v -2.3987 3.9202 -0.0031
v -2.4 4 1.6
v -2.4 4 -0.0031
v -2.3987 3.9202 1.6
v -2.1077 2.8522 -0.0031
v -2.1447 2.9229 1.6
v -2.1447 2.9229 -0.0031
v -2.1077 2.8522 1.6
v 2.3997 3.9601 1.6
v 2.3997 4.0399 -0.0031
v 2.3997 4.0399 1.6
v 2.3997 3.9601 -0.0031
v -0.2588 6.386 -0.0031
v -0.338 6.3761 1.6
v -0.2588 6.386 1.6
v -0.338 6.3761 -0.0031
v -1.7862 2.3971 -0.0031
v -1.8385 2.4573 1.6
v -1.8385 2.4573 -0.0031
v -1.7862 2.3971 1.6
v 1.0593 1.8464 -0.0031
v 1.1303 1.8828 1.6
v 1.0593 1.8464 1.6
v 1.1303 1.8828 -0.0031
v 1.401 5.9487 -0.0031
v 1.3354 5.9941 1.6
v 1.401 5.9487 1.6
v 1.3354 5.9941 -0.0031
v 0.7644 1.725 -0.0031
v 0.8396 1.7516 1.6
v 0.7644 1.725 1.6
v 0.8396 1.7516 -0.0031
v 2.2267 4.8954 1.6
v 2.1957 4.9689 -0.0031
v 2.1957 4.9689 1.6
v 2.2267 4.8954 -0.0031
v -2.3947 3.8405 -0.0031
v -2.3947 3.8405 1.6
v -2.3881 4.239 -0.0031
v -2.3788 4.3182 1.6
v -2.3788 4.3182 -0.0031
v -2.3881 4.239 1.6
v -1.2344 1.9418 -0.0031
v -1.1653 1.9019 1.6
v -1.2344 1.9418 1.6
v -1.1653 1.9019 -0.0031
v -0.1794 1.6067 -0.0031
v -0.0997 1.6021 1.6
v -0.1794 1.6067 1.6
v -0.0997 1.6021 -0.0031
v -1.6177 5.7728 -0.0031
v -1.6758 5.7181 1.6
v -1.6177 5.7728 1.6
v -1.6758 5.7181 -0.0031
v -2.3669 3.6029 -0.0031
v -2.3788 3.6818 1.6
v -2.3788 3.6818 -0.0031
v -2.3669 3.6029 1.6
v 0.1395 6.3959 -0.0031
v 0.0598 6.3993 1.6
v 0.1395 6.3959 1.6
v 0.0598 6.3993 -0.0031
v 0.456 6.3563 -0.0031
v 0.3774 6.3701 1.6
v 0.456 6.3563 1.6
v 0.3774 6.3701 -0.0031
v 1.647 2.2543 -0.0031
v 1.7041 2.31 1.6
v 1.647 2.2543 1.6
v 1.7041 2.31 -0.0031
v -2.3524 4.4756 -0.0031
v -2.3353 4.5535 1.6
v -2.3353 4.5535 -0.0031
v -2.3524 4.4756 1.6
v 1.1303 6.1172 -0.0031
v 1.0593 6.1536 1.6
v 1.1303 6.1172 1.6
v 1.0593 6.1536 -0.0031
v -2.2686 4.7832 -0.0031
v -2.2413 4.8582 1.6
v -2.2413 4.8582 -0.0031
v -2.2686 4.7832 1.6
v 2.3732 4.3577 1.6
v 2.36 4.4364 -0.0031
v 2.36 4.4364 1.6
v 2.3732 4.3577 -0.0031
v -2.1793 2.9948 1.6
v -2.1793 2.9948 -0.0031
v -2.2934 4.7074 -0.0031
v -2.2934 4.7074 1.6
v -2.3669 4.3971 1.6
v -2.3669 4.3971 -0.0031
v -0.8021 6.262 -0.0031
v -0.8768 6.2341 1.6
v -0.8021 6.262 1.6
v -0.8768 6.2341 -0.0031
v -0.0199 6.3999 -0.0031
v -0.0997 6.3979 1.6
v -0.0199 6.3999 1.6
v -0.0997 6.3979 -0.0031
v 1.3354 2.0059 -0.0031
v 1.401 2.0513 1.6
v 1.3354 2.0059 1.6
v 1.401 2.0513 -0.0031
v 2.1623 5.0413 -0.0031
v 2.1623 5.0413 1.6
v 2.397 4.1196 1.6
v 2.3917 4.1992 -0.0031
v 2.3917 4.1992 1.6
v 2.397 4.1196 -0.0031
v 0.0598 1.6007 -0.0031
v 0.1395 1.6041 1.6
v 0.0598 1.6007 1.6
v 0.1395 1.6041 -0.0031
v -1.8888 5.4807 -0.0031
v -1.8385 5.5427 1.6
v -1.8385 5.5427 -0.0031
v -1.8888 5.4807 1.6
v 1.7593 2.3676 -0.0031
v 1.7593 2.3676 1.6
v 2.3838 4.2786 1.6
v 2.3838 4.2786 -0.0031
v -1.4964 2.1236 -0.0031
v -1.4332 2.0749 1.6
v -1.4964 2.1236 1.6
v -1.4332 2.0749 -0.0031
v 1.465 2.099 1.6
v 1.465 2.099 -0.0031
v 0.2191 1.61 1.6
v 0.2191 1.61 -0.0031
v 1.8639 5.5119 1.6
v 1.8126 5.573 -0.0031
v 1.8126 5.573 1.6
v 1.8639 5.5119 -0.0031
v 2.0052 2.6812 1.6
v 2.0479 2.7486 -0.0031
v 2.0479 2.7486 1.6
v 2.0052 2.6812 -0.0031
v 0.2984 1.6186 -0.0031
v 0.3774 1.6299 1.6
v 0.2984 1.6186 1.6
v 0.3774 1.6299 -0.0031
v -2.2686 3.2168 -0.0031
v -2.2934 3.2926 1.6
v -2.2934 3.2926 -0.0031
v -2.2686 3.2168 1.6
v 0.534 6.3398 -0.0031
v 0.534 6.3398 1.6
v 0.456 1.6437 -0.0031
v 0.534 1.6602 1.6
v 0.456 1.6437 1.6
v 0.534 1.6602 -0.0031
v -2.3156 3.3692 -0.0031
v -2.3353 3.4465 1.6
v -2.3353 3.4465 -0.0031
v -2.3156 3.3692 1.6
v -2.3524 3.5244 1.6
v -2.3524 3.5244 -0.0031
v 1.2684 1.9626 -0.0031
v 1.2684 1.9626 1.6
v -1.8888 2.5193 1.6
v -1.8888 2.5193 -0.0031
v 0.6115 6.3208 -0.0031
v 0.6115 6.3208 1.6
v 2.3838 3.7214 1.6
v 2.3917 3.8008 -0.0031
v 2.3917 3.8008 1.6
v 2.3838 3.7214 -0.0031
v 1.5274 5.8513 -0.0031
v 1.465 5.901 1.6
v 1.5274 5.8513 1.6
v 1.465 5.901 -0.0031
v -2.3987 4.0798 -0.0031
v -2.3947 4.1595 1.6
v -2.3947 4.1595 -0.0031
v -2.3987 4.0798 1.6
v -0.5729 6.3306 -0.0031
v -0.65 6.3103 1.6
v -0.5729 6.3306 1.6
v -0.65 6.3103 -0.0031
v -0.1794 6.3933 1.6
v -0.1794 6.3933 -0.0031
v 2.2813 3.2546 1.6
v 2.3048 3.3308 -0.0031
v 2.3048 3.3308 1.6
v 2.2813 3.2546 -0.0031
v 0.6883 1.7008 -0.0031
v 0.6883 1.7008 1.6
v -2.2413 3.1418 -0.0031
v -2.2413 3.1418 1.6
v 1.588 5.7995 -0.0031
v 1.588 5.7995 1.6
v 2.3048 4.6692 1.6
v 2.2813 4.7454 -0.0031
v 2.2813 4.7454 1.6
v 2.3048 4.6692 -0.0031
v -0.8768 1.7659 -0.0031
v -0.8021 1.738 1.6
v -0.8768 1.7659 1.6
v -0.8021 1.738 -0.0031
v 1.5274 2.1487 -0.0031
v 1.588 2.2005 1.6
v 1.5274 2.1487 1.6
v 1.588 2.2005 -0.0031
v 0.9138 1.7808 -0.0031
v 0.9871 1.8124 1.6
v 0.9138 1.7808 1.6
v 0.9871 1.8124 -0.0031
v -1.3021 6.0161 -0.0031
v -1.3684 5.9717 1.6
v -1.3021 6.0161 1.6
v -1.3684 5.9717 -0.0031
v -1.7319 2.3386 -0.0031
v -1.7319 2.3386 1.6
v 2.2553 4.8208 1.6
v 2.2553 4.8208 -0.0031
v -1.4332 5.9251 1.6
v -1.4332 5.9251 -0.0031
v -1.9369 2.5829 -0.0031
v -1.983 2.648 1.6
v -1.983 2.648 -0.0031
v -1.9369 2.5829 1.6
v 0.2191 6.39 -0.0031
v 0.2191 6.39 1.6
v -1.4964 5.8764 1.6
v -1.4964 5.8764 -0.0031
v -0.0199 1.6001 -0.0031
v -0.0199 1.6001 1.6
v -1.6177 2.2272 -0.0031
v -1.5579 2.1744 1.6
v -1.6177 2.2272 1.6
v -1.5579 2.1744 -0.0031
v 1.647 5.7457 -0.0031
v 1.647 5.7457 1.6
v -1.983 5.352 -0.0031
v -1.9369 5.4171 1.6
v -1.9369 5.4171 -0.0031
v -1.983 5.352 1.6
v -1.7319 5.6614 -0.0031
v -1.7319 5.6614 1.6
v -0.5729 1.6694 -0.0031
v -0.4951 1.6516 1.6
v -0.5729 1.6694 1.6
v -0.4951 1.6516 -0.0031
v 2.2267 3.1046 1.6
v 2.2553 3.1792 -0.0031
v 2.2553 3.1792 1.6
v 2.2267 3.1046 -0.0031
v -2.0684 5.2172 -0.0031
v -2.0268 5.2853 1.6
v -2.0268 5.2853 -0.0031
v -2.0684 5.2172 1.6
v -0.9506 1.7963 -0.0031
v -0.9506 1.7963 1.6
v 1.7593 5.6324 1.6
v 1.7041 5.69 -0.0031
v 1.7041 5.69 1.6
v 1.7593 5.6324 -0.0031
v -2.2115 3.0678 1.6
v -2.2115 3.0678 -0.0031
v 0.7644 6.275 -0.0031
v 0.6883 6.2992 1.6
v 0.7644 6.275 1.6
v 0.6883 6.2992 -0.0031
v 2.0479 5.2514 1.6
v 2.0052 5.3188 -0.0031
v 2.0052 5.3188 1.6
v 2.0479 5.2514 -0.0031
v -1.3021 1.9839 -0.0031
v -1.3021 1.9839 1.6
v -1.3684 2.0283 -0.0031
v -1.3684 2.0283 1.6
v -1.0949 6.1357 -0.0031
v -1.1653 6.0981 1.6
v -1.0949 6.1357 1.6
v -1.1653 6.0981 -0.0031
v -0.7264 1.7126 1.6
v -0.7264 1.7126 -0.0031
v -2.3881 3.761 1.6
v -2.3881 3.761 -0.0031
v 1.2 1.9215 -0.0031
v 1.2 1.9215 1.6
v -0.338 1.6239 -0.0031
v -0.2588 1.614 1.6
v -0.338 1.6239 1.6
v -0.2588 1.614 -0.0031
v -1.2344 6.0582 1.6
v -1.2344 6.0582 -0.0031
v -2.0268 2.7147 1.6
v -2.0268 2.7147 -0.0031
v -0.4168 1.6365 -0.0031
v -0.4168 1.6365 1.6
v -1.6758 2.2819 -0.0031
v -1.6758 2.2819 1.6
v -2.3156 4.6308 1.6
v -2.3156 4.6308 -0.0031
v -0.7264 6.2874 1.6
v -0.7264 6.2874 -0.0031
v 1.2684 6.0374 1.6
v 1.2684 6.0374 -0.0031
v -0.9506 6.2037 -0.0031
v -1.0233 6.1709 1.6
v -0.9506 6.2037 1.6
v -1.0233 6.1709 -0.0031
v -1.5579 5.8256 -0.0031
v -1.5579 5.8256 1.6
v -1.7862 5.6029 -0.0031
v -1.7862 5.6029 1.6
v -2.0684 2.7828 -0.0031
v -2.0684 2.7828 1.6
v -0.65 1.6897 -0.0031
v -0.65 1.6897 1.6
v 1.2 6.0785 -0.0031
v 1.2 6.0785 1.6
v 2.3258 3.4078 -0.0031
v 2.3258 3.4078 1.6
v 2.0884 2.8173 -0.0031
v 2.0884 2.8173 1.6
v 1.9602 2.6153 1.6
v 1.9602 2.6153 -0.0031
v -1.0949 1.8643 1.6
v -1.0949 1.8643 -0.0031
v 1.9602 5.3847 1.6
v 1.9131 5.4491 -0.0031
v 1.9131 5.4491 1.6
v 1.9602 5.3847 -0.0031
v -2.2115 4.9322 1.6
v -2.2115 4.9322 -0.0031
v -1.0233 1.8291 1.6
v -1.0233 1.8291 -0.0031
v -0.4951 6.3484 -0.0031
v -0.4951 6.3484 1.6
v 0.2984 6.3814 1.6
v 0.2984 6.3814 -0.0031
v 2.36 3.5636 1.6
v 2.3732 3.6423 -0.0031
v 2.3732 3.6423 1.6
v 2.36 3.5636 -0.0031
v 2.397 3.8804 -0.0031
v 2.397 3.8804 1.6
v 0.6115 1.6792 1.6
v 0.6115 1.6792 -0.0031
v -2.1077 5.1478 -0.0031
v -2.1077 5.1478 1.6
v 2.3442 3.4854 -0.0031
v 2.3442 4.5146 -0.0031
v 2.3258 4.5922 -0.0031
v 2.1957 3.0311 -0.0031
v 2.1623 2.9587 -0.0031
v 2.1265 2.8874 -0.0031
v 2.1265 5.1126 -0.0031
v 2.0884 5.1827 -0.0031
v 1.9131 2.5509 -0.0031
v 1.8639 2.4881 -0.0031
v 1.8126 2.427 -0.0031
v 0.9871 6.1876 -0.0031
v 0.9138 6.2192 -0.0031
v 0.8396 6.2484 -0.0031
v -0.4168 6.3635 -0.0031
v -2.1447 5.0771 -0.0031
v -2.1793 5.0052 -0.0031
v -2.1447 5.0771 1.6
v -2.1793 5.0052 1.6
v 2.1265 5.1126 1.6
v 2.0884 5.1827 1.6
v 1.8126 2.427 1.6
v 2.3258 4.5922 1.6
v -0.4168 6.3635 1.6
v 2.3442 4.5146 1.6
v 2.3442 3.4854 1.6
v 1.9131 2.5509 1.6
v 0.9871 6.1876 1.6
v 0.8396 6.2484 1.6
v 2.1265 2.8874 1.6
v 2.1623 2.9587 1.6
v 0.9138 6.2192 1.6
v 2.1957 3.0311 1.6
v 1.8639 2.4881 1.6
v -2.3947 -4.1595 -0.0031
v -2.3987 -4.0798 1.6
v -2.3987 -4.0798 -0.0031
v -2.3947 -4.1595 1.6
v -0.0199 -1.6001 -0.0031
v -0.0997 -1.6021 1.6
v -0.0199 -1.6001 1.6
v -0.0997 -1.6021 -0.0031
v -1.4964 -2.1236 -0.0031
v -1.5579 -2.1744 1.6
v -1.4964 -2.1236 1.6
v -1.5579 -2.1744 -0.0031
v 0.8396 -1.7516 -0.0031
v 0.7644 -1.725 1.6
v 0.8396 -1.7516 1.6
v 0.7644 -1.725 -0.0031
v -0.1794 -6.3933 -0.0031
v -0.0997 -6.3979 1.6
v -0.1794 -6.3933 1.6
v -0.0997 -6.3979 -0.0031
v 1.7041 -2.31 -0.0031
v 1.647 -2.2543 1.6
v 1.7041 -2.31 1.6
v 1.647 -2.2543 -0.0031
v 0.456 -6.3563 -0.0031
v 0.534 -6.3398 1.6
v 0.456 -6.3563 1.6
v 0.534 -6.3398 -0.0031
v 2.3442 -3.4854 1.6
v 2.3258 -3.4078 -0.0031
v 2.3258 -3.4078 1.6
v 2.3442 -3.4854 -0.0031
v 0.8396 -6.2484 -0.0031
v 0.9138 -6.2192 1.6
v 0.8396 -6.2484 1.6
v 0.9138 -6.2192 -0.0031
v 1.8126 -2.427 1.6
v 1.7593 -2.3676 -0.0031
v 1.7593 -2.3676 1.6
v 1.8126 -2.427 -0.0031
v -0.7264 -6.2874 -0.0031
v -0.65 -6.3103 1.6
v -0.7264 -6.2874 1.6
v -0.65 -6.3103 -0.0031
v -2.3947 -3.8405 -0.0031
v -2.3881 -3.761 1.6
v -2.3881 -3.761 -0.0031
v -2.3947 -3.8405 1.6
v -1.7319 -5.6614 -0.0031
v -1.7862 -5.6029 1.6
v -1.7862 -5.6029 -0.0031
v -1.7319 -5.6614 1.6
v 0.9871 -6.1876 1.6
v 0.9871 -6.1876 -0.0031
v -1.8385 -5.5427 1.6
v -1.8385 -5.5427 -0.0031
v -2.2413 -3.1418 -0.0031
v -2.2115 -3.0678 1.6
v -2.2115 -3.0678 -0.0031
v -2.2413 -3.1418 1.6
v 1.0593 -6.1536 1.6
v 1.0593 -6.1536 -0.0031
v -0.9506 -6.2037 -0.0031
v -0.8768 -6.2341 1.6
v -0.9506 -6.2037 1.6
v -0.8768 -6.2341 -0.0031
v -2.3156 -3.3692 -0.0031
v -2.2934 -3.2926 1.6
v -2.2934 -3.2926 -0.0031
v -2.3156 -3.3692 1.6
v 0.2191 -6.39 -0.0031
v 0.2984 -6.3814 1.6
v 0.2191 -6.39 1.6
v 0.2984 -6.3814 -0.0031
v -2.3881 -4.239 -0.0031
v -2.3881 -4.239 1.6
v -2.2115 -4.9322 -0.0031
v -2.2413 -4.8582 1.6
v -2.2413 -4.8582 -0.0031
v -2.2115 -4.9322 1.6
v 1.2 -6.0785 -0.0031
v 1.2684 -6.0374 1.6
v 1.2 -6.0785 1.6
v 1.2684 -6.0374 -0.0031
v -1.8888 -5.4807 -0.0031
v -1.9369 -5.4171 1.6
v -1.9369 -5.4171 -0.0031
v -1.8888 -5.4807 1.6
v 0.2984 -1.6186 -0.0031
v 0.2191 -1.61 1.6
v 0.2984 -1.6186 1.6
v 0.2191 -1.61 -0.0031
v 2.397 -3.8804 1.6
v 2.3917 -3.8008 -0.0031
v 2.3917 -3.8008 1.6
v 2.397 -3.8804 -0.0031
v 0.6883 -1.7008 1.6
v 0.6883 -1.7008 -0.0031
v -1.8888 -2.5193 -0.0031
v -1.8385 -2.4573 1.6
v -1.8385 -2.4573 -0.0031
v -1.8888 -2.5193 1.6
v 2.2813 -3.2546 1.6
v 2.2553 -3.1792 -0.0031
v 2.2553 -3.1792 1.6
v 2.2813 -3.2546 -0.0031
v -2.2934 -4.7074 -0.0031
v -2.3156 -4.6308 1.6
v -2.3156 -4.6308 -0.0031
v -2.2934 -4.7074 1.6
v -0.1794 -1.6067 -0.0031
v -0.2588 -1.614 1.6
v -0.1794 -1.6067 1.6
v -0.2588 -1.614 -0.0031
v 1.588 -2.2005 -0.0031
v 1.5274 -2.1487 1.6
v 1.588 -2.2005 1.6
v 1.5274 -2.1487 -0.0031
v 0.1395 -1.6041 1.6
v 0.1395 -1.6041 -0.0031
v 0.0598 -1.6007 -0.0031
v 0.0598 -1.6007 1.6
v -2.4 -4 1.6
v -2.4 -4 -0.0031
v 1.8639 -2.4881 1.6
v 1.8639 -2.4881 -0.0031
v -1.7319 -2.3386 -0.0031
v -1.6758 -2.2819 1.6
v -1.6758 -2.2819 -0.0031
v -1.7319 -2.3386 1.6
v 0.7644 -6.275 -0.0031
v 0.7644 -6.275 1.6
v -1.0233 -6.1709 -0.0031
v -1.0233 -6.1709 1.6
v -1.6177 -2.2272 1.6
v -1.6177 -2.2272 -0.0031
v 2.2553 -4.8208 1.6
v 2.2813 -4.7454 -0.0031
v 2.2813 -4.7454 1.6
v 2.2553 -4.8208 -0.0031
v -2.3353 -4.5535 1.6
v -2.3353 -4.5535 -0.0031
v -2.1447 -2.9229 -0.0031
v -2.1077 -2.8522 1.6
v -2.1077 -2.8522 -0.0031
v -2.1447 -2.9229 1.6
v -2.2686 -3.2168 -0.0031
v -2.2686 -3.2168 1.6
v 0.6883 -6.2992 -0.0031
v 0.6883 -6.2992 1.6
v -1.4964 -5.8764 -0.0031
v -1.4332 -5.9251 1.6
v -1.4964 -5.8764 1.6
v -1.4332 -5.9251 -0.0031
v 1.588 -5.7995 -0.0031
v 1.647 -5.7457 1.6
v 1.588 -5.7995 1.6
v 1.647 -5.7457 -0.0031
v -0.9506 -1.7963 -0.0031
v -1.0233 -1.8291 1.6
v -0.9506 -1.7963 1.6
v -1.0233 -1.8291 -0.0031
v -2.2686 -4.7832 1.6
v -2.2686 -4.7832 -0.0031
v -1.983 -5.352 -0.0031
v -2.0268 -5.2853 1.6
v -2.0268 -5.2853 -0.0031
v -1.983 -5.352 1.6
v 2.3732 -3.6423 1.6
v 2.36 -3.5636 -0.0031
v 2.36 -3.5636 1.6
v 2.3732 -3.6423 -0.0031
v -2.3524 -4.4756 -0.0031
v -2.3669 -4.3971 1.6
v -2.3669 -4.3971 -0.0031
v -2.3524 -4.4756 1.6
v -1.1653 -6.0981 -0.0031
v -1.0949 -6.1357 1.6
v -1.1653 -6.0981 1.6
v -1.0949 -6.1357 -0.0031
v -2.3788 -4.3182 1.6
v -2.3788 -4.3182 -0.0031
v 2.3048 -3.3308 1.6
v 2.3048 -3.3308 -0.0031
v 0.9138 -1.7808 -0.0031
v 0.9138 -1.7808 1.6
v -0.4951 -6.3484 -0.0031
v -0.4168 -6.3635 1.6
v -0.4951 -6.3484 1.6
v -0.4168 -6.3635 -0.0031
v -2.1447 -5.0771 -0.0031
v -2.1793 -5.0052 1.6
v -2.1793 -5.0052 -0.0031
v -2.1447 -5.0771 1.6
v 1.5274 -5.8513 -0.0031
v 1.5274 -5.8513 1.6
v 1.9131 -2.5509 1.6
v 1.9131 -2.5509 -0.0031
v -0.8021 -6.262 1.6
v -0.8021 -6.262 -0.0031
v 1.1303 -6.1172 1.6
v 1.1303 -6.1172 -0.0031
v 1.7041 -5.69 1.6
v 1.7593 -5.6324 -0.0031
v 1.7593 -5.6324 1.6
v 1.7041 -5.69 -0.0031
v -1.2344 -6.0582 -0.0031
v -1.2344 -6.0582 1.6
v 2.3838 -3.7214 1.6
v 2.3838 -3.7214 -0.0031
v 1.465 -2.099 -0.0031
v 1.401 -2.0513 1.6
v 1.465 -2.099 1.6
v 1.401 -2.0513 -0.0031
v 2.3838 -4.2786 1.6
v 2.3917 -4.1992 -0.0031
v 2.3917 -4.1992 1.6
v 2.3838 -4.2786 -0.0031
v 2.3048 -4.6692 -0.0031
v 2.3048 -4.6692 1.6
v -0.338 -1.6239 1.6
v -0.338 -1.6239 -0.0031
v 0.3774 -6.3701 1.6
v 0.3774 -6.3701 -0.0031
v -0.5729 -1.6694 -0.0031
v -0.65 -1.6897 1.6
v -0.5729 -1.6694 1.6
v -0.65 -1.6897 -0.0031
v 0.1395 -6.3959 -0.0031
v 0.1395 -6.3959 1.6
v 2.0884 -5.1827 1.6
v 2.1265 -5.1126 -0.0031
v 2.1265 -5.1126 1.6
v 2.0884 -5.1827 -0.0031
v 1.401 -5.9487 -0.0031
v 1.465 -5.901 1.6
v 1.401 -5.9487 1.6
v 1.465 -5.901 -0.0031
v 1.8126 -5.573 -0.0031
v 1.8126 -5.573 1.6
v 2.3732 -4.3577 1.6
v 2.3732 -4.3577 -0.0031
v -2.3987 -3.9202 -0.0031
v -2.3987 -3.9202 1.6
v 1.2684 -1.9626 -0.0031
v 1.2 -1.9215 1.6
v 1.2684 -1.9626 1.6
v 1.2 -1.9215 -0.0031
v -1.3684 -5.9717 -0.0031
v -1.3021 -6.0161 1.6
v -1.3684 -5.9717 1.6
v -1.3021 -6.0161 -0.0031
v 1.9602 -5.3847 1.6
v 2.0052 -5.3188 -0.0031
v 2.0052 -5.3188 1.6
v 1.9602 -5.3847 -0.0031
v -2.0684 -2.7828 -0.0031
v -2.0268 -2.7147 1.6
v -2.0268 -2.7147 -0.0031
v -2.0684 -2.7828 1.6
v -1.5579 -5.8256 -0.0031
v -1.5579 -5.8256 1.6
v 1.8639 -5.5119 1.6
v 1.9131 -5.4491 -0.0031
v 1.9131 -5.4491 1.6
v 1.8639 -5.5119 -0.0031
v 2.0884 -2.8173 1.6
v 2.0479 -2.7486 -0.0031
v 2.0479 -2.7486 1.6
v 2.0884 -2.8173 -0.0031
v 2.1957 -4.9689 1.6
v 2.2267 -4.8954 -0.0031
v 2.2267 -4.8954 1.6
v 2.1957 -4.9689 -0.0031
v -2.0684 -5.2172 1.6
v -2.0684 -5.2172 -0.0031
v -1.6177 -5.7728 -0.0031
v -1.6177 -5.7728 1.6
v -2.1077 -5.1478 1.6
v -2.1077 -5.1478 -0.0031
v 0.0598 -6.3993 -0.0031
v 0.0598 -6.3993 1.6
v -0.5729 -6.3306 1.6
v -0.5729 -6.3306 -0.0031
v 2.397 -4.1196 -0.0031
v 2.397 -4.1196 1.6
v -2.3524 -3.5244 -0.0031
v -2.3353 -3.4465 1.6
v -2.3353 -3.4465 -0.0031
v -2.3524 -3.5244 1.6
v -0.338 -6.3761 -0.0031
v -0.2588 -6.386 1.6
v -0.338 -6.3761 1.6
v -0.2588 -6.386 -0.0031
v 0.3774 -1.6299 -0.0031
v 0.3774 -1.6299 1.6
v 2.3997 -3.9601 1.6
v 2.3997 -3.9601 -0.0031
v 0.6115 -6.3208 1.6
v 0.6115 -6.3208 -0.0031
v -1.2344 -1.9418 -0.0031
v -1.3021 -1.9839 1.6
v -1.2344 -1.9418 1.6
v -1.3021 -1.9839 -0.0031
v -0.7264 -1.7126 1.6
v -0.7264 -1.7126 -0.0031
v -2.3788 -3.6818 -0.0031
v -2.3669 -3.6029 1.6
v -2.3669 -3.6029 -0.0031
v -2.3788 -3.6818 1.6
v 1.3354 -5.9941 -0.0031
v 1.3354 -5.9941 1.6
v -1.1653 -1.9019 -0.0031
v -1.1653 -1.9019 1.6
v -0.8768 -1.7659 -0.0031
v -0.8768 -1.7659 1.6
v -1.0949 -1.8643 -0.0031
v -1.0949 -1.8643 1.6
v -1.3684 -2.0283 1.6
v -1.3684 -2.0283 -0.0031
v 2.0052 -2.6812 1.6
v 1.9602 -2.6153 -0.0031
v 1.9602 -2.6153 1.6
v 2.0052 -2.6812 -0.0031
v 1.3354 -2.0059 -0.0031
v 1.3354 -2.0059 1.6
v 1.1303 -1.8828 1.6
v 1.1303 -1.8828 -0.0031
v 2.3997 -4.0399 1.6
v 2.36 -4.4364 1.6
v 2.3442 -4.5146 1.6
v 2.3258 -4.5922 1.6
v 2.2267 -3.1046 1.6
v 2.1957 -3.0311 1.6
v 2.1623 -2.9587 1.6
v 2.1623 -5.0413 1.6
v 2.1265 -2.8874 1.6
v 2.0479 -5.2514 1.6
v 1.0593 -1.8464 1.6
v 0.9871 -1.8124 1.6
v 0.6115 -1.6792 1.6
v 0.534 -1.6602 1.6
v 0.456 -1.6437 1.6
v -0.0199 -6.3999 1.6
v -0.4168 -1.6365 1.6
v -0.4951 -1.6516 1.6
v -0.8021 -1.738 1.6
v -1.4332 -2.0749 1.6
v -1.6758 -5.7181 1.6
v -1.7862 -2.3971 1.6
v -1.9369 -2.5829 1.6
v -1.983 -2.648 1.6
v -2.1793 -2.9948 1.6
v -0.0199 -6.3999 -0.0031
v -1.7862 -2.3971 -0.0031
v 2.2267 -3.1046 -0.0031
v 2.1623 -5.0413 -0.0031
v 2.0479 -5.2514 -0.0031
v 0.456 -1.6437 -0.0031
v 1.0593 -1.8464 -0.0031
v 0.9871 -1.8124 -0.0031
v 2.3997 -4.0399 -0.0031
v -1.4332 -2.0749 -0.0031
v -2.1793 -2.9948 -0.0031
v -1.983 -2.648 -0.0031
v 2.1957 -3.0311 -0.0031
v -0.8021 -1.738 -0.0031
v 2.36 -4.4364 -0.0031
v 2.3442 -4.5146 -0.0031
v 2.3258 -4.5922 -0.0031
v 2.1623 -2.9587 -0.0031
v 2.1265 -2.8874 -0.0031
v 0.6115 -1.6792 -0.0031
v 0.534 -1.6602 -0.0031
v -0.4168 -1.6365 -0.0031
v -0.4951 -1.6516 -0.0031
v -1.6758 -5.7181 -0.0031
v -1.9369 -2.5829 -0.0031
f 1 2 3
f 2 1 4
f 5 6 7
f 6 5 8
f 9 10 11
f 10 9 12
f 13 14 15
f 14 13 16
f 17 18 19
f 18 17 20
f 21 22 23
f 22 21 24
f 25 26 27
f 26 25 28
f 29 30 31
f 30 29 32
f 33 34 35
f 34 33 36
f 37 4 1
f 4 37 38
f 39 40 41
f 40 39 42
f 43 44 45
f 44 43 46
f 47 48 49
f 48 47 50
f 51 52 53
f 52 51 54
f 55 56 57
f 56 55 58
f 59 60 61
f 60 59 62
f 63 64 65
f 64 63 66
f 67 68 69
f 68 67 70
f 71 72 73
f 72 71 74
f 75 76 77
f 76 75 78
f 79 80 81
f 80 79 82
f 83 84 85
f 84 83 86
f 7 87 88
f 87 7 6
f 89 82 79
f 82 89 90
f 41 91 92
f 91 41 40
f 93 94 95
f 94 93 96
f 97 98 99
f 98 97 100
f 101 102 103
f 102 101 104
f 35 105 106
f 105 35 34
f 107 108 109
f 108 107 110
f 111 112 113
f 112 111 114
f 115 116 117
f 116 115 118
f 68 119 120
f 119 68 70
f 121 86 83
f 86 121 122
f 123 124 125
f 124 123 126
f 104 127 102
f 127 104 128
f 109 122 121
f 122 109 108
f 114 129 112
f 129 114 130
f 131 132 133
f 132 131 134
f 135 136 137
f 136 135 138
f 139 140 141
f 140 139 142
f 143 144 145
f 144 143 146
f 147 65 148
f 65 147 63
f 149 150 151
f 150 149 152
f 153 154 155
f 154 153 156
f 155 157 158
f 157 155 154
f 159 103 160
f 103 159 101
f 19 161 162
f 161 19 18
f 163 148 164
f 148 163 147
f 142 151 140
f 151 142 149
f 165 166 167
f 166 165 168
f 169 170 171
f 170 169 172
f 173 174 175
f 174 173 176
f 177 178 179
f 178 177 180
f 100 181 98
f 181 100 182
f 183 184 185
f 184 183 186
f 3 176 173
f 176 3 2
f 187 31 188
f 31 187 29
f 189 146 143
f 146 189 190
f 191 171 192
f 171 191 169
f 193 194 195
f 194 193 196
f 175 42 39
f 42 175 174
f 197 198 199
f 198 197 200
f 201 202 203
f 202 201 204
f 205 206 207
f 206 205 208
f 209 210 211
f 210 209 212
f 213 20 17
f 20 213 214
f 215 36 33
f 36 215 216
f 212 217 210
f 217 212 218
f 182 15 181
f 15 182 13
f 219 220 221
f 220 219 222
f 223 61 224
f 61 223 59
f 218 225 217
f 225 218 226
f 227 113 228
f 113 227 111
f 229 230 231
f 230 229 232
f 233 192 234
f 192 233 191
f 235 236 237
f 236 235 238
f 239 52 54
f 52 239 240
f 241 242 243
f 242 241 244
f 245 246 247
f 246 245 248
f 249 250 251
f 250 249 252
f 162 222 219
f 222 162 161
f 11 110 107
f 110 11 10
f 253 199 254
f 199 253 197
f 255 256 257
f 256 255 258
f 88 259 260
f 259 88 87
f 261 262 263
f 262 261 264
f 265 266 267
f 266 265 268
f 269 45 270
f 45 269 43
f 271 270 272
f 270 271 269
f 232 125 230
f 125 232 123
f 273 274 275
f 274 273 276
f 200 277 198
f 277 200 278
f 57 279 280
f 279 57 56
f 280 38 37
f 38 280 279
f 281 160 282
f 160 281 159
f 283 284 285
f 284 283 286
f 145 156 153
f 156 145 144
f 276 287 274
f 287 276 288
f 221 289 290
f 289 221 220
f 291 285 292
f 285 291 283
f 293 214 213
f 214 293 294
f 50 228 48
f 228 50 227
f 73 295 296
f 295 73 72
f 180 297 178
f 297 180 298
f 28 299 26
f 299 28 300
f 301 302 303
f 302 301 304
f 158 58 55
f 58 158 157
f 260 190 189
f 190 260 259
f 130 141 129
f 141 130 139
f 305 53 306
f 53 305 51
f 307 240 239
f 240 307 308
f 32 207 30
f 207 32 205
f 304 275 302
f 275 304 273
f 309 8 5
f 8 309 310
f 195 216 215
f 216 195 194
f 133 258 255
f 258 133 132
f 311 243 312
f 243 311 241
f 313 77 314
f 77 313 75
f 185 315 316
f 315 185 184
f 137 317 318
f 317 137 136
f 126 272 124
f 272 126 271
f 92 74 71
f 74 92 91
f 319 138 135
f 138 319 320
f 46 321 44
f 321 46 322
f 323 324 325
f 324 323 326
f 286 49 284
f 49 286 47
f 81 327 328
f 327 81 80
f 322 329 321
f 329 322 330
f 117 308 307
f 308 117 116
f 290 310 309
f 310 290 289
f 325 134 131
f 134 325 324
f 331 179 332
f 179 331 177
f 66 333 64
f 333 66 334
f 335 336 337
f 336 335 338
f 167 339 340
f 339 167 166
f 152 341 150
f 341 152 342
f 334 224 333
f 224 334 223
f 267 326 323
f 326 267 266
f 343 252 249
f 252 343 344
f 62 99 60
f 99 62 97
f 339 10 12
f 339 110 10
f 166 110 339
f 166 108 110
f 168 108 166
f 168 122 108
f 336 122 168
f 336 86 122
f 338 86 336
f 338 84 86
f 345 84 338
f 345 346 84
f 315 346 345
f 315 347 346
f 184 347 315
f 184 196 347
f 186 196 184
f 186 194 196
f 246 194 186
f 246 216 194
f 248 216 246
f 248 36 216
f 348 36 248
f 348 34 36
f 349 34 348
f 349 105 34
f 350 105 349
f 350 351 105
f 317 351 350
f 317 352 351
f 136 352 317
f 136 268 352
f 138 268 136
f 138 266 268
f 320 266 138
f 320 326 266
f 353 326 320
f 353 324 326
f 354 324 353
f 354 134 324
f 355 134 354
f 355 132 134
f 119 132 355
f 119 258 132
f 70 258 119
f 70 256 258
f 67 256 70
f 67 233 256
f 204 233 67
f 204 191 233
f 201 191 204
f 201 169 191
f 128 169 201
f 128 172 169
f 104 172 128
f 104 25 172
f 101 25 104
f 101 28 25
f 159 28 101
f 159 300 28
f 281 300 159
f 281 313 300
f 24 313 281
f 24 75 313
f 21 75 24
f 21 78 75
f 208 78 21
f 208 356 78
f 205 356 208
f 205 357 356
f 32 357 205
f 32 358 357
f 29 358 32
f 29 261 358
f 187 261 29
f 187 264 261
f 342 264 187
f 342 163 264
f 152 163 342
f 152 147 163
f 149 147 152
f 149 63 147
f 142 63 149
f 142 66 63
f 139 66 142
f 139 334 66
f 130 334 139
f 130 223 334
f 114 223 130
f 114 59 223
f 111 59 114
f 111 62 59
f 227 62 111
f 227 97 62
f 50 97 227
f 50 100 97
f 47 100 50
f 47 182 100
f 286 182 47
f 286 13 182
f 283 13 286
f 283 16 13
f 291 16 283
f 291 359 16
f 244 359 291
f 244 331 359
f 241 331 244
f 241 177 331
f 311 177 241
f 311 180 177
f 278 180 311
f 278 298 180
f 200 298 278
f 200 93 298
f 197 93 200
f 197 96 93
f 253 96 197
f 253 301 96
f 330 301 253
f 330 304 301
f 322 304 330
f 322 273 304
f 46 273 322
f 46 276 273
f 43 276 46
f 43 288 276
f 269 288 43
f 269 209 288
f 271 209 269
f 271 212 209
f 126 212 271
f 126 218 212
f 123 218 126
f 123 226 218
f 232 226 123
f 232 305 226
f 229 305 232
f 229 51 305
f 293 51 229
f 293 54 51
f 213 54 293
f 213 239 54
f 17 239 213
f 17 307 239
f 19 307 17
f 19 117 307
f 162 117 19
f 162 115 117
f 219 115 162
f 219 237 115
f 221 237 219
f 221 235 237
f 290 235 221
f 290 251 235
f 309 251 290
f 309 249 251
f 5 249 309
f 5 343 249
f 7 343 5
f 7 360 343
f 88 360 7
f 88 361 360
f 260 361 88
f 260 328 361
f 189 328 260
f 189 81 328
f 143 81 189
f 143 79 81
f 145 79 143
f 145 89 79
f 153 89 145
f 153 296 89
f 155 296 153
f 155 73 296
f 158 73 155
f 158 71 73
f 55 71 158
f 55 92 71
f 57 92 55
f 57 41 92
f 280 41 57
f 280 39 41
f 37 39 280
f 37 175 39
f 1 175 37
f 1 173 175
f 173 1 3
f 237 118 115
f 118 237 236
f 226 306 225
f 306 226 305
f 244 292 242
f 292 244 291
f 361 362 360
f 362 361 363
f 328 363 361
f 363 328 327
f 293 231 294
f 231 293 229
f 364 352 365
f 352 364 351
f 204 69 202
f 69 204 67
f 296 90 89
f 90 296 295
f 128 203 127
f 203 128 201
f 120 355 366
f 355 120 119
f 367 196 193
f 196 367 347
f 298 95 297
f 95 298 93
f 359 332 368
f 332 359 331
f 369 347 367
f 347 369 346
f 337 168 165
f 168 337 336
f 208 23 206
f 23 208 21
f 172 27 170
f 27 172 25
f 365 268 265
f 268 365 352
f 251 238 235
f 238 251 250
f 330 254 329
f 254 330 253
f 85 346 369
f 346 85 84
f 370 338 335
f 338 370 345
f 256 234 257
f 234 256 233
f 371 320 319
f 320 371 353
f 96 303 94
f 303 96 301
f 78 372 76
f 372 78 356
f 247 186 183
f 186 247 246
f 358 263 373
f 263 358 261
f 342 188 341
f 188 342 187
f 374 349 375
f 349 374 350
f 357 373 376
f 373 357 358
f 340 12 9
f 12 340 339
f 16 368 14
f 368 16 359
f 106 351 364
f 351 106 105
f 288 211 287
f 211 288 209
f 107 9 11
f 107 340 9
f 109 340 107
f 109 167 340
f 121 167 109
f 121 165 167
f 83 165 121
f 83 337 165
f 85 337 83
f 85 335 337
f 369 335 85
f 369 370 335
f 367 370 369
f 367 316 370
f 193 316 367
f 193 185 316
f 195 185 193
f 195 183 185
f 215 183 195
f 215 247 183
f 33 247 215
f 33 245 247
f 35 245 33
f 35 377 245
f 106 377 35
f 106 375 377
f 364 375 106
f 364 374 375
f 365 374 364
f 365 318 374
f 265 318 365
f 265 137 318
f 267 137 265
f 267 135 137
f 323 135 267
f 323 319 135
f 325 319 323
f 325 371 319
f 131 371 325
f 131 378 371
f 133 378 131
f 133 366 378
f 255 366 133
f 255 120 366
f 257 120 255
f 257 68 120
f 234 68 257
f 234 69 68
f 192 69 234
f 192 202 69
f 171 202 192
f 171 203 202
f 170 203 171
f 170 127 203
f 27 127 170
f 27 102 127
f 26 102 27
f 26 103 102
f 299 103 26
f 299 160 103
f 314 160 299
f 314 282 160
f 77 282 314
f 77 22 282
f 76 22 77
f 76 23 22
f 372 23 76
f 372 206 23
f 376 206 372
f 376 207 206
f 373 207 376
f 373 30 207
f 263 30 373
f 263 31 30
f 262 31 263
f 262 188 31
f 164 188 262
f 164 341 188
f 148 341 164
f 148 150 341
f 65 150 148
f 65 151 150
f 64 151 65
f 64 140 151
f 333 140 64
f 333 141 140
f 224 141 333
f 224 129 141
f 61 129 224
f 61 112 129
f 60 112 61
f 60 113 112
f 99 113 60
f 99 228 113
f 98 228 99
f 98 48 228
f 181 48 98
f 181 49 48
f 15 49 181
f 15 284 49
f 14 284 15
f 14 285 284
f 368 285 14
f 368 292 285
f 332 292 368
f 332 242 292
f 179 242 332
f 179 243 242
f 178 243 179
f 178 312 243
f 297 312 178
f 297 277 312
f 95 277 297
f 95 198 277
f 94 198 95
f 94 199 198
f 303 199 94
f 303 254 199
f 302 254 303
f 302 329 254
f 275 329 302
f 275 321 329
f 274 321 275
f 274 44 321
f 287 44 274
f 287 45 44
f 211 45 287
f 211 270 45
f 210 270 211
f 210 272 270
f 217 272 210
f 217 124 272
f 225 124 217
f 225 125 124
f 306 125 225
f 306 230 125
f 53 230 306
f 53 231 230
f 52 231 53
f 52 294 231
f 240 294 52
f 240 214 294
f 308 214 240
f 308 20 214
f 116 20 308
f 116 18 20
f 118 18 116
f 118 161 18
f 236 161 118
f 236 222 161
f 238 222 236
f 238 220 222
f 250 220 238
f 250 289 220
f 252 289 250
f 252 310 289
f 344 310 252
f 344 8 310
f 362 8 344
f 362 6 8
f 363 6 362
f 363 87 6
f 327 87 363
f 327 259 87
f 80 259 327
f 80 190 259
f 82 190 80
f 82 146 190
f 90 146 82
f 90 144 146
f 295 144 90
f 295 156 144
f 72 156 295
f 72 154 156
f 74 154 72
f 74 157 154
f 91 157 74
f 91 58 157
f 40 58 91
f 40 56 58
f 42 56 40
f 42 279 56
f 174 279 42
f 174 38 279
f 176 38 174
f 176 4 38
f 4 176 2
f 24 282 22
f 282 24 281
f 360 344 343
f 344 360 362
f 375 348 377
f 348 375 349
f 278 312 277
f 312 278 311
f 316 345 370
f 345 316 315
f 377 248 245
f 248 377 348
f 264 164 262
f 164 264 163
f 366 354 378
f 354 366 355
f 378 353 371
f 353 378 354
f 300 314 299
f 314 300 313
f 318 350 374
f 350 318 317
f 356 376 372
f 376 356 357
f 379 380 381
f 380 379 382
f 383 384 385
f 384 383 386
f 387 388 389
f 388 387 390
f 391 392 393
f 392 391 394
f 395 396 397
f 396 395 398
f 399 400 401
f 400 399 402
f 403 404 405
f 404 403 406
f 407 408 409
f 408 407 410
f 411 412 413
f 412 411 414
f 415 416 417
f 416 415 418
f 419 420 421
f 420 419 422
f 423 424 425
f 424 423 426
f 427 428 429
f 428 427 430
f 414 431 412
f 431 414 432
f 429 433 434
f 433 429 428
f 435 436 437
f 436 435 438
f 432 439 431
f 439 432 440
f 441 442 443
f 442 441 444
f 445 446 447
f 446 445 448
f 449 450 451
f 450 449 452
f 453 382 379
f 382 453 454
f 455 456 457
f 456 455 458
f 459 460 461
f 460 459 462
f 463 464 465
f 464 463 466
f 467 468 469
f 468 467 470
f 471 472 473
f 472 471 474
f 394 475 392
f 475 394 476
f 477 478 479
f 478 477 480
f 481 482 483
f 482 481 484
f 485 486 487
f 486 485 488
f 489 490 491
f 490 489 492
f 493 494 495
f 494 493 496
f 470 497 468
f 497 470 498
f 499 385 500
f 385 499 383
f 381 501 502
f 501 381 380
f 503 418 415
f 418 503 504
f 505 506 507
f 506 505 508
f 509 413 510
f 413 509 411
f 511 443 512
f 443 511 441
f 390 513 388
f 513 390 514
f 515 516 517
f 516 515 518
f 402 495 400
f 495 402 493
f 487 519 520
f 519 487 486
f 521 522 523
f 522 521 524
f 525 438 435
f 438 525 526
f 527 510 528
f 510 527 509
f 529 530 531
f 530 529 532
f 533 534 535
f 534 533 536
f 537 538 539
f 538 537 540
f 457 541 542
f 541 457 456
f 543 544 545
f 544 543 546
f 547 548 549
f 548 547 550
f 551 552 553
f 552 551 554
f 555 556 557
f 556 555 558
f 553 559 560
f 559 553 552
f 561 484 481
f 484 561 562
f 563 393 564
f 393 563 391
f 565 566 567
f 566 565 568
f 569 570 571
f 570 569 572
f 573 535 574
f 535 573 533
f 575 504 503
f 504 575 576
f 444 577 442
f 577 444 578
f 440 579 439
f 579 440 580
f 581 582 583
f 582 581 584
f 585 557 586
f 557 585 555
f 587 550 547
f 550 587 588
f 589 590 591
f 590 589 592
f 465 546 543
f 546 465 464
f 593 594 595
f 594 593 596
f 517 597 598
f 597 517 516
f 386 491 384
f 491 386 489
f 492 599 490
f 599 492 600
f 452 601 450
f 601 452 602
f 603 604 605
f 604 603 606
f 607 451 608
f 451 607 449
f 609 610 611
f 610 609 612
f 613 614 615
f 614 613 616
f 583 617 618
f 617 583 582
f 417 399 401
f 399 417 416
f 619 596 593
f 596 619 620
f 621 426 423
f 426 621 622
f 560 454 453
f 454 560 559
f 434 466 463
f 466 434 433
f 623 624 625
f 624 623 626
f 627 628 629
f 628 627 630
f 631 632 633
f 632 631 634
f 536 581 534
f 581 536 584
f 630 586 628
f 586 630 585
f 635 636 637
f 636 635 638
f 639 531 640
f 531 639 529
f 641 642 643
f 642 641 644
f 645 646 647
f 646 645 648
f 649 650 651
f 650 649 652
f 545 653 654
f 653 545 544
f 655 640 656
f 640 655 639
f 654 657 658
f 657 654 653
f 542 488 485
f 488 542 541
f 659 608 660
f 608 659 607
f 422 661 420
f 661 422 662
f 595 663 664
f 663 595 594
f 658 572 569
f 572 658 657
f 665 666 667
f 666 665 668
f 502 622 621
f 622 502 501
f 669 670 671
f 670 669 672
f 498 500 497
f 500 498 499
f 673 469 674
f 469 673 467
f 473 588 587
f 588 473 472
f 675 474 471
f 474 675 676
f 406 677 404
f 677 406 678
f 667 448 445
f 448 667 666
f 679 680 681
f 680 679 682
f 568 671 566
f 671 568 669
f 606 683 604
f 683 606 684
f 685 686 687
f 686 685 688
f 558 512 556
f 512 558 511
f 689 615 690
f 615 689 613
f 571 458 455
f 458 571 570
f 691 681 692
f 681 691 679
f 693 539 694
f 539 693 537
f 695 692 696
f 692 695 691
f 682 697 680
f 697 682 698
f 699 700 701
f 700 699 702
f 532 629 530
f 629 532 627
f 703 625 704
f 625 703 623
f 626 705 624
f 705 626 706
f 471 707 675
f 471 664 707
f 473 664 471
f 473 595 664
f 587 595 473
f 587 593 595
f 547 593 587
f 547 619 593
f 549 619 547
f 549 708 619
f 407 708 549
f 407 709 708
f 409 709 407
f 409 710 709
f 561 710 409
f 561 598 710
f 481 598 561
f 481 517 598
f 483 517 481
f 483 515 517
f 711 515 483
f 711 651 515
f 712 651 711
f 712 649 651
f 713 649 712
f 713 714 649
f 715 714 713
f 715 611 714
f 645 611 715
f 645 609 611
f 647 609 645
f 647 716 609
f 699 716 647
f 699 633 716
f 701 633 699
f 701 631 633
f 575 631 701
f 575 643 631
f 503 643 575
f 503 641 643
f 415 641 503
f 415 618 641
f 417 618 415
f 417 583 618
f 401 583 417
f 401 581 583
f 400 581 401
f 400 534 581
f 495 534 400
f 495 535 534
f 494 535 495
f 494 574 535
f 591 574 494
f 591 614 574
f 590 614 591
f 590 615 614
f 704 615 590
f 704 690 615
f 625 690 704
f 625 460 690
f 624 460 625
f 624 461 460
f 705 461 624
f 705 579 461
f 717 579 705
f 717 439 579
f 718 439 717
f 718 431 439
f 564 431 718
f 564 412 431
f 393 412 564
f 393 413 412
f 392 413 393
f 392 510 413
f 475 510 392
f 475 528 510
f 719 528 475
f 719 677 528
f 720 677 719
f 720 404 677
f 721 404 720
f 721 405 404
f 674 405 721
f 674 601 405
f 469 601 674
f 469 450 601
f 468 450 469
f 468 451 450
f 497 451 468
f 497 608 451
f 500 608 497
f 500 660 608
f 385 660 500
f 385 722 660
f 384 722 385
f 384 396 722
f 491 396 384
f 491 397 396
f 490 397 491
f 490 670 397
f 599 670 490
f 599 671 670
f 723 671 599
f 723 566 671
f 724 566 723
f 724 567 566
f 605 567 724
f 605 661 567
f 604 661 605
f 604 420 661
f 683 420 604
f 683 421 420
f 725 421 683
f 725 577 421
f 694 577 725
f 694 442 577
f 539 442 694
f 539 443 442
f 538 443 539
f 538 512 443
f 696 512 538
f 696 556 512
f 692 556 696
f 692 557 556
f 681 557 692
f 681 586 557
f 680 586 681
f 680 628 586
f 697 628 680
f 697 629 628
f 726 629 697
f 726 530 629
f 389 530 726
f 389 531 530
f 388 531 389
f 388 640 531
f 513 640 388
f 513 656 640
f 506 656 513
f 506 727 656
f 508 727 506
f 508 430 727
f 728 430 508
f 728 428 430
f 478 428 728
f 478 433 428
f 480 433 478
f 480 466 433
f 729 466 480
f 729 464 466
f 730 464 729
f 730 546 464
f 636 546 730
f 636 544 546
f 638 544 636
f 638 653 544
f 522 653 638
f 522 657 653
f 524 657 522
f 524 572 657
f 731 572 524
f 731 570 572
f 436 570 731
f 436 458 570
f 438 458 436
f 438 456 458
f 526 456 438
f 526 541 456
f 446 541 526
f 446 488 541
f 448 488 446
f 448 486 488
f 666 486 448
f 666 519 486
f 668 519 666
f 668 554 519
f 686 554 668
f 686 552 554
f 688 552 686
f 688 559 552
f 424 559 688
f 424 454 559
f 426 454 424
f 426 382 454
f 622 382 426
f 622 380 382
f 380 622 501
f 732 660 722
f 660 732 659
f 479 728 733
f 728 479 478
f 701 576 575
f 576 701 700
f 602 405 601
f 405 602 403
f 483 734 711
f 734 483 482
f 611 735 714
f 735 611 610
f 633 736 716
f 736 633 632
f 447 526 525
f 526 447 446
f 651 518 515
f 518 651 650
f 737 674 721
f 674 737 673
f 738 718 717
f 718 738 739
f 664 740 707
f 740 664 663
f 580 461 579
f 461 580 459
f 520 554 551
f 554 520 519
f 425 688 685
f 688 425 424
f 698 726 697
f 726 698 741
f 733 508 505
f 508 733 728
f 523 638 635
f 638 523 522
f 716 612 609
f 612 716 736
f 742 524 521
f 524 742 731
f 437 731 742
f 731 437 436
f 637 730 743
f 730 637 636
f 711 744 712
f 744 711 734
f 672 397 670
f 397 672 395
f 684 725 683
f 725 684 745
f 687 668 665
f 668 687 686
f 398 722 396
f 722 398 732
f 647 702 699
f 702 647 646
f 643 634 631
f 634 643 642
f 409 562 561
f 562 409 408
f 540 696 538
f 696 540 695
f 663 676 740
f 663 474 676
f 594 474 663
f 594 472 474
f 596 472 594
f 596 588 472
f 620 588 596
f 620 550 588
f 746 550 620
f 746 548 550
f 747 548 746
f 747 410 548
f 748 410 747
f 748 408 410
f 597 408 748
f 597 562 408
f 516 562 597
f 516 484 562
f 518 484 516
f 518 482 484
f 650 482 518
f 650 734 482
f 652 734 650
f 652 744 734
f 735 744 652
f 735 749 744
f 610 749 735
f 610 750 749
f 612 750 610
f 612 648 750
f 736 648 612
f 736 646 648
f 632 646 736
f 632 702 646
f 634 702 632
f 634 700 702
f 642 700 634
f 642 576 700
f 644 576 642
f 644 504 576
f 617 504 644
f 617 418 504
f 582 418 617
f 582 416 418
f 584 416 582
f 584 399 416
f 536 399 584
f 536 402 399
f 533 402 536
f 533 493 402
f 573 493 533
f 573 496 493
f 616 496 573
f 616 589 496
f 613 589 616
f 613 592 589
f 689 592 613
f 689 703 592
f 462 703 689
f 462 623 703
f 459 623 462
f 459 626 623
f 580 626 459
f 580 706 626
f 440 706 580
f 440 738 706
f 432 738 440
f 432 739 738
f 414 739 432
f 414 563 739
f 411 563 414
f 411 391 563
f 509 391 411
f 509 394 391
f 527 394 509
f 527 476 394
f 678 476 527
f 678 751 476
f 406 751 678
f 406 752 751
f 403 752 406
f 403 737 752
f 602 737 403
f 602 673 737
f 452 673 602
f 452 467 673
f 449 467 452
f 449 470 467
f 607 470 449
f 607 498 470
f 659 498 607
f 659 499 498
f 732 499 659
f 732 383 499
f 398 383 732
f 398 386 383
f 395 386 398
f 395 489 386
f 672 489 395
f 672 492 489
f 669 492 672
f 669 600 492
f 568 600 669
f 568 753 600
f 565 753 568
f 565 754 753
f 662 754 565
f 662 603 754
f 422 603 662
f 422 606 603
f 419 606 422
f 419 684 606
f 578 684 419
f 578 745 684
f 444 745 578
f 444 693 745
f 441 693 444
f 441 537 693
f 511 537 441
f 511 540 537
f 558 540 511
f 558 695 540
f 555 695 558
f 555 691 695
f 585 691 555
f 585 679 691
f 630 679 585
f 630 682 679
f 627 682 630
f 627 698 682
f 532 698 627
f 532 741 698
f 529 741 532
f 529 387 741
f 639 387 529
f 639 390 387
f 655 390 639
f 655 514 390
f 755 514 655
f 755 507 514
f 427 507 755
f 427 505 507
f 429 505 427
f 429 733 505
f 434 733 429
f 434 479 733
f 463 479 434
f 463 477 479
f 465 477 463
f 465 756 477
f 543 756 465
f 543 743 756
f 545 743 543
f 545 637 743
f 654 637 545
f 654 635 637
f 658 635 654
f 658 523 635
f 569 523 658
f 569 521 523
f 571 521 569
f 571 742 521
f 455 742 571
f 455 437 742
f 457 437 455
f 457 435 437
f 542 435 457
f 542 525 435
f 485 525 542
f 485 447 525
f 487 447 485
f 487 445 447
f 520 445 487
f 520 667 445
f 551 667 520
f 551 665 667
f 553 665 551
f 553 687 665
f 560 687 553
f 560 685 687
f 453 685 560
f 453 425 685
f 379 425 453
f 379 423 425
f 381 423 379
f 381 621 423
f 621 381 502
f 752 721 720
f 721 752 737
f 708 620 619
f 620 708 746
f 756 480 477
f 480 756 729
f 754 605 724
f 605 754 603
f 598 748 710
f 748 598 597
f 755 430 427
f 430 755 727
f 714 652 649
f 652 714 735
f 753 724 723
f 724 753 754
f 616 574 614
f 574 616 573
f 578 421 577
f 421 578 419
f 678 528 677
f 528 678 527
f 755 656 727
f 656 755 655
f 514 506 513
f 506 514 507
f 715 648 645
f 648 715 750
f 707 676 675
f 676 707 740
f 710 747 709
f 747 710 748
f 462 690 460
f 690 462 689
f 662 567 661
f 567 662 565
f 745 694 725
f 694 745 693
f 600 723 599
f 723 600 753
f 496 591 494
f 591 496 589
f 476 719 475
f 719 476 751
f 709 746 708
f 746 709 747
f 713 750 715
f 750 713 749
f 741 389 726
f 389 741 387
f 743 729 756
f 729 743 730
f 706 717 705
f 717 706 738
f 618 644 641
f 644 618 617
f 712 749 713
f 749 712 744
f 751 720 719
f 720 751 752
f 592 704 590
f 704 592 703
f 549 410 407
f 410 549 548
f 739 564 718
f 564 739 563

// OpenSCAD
use <../lib.scad>
use <41749.scad>
$fa=1; $fs=0.2;
function ldraw_lib__42019(realsolid=false) = [
// 0 =Slope Brick Round  3 x  8 x  2 Right
// 0 Name: 42019.dat
// 0 Author: Chris Dee [cwdee]
// 0 !LDRAW_ORG Part Alias UPDATE 2013-02
// 0 !LICENSE Licensed under CC BY 2.0 and CC BY 4.0 : see CAreadme.txt
// 
// 0 !HELP Part 42019 is the counterpart of 41749. Visually, the two parts seem
// 0 !HELP identical. This file is provided to make it easier to locate part files
// 0 !HELP when using the numbers from other sources.
// 0 !HELP 41749 is used for moulding opaque parts, 42019 for transparent parts.
// 
// 0 BFC CERTIFY CW
  [0,"BFC","CERTIFY"],
  [0,"BFC","CW"],
// 
// 0 !HISTORY 2009-09-03 [PTadmin] Official Update 2009-02
// 0 !HISTORY 2013-12-14 [cwdee] Add = prefix
// 0 !HISTORY 2013-12-23 [PTadmin] Official Update 2013-02
// 
// 
// 1 16 0 0 0 1 0 0 0 1 0 0 0 1 41749.dat
  [1,16,0,0,0,1,0,0,0,1,0,0,0,1, ldraw_lib__41749(realsolid)],
// 0
];
module ldraw_lib__42019(step=0, col=false, unit=2/5, alt=false, line=0.2, solid=!$preview)
    makepoly(ldraw_lib__42019(solid), step=step, col=col, unit=unit, alt=alt, line=line, solid=solid);
ldraw_lib__42019(line=0.2);
